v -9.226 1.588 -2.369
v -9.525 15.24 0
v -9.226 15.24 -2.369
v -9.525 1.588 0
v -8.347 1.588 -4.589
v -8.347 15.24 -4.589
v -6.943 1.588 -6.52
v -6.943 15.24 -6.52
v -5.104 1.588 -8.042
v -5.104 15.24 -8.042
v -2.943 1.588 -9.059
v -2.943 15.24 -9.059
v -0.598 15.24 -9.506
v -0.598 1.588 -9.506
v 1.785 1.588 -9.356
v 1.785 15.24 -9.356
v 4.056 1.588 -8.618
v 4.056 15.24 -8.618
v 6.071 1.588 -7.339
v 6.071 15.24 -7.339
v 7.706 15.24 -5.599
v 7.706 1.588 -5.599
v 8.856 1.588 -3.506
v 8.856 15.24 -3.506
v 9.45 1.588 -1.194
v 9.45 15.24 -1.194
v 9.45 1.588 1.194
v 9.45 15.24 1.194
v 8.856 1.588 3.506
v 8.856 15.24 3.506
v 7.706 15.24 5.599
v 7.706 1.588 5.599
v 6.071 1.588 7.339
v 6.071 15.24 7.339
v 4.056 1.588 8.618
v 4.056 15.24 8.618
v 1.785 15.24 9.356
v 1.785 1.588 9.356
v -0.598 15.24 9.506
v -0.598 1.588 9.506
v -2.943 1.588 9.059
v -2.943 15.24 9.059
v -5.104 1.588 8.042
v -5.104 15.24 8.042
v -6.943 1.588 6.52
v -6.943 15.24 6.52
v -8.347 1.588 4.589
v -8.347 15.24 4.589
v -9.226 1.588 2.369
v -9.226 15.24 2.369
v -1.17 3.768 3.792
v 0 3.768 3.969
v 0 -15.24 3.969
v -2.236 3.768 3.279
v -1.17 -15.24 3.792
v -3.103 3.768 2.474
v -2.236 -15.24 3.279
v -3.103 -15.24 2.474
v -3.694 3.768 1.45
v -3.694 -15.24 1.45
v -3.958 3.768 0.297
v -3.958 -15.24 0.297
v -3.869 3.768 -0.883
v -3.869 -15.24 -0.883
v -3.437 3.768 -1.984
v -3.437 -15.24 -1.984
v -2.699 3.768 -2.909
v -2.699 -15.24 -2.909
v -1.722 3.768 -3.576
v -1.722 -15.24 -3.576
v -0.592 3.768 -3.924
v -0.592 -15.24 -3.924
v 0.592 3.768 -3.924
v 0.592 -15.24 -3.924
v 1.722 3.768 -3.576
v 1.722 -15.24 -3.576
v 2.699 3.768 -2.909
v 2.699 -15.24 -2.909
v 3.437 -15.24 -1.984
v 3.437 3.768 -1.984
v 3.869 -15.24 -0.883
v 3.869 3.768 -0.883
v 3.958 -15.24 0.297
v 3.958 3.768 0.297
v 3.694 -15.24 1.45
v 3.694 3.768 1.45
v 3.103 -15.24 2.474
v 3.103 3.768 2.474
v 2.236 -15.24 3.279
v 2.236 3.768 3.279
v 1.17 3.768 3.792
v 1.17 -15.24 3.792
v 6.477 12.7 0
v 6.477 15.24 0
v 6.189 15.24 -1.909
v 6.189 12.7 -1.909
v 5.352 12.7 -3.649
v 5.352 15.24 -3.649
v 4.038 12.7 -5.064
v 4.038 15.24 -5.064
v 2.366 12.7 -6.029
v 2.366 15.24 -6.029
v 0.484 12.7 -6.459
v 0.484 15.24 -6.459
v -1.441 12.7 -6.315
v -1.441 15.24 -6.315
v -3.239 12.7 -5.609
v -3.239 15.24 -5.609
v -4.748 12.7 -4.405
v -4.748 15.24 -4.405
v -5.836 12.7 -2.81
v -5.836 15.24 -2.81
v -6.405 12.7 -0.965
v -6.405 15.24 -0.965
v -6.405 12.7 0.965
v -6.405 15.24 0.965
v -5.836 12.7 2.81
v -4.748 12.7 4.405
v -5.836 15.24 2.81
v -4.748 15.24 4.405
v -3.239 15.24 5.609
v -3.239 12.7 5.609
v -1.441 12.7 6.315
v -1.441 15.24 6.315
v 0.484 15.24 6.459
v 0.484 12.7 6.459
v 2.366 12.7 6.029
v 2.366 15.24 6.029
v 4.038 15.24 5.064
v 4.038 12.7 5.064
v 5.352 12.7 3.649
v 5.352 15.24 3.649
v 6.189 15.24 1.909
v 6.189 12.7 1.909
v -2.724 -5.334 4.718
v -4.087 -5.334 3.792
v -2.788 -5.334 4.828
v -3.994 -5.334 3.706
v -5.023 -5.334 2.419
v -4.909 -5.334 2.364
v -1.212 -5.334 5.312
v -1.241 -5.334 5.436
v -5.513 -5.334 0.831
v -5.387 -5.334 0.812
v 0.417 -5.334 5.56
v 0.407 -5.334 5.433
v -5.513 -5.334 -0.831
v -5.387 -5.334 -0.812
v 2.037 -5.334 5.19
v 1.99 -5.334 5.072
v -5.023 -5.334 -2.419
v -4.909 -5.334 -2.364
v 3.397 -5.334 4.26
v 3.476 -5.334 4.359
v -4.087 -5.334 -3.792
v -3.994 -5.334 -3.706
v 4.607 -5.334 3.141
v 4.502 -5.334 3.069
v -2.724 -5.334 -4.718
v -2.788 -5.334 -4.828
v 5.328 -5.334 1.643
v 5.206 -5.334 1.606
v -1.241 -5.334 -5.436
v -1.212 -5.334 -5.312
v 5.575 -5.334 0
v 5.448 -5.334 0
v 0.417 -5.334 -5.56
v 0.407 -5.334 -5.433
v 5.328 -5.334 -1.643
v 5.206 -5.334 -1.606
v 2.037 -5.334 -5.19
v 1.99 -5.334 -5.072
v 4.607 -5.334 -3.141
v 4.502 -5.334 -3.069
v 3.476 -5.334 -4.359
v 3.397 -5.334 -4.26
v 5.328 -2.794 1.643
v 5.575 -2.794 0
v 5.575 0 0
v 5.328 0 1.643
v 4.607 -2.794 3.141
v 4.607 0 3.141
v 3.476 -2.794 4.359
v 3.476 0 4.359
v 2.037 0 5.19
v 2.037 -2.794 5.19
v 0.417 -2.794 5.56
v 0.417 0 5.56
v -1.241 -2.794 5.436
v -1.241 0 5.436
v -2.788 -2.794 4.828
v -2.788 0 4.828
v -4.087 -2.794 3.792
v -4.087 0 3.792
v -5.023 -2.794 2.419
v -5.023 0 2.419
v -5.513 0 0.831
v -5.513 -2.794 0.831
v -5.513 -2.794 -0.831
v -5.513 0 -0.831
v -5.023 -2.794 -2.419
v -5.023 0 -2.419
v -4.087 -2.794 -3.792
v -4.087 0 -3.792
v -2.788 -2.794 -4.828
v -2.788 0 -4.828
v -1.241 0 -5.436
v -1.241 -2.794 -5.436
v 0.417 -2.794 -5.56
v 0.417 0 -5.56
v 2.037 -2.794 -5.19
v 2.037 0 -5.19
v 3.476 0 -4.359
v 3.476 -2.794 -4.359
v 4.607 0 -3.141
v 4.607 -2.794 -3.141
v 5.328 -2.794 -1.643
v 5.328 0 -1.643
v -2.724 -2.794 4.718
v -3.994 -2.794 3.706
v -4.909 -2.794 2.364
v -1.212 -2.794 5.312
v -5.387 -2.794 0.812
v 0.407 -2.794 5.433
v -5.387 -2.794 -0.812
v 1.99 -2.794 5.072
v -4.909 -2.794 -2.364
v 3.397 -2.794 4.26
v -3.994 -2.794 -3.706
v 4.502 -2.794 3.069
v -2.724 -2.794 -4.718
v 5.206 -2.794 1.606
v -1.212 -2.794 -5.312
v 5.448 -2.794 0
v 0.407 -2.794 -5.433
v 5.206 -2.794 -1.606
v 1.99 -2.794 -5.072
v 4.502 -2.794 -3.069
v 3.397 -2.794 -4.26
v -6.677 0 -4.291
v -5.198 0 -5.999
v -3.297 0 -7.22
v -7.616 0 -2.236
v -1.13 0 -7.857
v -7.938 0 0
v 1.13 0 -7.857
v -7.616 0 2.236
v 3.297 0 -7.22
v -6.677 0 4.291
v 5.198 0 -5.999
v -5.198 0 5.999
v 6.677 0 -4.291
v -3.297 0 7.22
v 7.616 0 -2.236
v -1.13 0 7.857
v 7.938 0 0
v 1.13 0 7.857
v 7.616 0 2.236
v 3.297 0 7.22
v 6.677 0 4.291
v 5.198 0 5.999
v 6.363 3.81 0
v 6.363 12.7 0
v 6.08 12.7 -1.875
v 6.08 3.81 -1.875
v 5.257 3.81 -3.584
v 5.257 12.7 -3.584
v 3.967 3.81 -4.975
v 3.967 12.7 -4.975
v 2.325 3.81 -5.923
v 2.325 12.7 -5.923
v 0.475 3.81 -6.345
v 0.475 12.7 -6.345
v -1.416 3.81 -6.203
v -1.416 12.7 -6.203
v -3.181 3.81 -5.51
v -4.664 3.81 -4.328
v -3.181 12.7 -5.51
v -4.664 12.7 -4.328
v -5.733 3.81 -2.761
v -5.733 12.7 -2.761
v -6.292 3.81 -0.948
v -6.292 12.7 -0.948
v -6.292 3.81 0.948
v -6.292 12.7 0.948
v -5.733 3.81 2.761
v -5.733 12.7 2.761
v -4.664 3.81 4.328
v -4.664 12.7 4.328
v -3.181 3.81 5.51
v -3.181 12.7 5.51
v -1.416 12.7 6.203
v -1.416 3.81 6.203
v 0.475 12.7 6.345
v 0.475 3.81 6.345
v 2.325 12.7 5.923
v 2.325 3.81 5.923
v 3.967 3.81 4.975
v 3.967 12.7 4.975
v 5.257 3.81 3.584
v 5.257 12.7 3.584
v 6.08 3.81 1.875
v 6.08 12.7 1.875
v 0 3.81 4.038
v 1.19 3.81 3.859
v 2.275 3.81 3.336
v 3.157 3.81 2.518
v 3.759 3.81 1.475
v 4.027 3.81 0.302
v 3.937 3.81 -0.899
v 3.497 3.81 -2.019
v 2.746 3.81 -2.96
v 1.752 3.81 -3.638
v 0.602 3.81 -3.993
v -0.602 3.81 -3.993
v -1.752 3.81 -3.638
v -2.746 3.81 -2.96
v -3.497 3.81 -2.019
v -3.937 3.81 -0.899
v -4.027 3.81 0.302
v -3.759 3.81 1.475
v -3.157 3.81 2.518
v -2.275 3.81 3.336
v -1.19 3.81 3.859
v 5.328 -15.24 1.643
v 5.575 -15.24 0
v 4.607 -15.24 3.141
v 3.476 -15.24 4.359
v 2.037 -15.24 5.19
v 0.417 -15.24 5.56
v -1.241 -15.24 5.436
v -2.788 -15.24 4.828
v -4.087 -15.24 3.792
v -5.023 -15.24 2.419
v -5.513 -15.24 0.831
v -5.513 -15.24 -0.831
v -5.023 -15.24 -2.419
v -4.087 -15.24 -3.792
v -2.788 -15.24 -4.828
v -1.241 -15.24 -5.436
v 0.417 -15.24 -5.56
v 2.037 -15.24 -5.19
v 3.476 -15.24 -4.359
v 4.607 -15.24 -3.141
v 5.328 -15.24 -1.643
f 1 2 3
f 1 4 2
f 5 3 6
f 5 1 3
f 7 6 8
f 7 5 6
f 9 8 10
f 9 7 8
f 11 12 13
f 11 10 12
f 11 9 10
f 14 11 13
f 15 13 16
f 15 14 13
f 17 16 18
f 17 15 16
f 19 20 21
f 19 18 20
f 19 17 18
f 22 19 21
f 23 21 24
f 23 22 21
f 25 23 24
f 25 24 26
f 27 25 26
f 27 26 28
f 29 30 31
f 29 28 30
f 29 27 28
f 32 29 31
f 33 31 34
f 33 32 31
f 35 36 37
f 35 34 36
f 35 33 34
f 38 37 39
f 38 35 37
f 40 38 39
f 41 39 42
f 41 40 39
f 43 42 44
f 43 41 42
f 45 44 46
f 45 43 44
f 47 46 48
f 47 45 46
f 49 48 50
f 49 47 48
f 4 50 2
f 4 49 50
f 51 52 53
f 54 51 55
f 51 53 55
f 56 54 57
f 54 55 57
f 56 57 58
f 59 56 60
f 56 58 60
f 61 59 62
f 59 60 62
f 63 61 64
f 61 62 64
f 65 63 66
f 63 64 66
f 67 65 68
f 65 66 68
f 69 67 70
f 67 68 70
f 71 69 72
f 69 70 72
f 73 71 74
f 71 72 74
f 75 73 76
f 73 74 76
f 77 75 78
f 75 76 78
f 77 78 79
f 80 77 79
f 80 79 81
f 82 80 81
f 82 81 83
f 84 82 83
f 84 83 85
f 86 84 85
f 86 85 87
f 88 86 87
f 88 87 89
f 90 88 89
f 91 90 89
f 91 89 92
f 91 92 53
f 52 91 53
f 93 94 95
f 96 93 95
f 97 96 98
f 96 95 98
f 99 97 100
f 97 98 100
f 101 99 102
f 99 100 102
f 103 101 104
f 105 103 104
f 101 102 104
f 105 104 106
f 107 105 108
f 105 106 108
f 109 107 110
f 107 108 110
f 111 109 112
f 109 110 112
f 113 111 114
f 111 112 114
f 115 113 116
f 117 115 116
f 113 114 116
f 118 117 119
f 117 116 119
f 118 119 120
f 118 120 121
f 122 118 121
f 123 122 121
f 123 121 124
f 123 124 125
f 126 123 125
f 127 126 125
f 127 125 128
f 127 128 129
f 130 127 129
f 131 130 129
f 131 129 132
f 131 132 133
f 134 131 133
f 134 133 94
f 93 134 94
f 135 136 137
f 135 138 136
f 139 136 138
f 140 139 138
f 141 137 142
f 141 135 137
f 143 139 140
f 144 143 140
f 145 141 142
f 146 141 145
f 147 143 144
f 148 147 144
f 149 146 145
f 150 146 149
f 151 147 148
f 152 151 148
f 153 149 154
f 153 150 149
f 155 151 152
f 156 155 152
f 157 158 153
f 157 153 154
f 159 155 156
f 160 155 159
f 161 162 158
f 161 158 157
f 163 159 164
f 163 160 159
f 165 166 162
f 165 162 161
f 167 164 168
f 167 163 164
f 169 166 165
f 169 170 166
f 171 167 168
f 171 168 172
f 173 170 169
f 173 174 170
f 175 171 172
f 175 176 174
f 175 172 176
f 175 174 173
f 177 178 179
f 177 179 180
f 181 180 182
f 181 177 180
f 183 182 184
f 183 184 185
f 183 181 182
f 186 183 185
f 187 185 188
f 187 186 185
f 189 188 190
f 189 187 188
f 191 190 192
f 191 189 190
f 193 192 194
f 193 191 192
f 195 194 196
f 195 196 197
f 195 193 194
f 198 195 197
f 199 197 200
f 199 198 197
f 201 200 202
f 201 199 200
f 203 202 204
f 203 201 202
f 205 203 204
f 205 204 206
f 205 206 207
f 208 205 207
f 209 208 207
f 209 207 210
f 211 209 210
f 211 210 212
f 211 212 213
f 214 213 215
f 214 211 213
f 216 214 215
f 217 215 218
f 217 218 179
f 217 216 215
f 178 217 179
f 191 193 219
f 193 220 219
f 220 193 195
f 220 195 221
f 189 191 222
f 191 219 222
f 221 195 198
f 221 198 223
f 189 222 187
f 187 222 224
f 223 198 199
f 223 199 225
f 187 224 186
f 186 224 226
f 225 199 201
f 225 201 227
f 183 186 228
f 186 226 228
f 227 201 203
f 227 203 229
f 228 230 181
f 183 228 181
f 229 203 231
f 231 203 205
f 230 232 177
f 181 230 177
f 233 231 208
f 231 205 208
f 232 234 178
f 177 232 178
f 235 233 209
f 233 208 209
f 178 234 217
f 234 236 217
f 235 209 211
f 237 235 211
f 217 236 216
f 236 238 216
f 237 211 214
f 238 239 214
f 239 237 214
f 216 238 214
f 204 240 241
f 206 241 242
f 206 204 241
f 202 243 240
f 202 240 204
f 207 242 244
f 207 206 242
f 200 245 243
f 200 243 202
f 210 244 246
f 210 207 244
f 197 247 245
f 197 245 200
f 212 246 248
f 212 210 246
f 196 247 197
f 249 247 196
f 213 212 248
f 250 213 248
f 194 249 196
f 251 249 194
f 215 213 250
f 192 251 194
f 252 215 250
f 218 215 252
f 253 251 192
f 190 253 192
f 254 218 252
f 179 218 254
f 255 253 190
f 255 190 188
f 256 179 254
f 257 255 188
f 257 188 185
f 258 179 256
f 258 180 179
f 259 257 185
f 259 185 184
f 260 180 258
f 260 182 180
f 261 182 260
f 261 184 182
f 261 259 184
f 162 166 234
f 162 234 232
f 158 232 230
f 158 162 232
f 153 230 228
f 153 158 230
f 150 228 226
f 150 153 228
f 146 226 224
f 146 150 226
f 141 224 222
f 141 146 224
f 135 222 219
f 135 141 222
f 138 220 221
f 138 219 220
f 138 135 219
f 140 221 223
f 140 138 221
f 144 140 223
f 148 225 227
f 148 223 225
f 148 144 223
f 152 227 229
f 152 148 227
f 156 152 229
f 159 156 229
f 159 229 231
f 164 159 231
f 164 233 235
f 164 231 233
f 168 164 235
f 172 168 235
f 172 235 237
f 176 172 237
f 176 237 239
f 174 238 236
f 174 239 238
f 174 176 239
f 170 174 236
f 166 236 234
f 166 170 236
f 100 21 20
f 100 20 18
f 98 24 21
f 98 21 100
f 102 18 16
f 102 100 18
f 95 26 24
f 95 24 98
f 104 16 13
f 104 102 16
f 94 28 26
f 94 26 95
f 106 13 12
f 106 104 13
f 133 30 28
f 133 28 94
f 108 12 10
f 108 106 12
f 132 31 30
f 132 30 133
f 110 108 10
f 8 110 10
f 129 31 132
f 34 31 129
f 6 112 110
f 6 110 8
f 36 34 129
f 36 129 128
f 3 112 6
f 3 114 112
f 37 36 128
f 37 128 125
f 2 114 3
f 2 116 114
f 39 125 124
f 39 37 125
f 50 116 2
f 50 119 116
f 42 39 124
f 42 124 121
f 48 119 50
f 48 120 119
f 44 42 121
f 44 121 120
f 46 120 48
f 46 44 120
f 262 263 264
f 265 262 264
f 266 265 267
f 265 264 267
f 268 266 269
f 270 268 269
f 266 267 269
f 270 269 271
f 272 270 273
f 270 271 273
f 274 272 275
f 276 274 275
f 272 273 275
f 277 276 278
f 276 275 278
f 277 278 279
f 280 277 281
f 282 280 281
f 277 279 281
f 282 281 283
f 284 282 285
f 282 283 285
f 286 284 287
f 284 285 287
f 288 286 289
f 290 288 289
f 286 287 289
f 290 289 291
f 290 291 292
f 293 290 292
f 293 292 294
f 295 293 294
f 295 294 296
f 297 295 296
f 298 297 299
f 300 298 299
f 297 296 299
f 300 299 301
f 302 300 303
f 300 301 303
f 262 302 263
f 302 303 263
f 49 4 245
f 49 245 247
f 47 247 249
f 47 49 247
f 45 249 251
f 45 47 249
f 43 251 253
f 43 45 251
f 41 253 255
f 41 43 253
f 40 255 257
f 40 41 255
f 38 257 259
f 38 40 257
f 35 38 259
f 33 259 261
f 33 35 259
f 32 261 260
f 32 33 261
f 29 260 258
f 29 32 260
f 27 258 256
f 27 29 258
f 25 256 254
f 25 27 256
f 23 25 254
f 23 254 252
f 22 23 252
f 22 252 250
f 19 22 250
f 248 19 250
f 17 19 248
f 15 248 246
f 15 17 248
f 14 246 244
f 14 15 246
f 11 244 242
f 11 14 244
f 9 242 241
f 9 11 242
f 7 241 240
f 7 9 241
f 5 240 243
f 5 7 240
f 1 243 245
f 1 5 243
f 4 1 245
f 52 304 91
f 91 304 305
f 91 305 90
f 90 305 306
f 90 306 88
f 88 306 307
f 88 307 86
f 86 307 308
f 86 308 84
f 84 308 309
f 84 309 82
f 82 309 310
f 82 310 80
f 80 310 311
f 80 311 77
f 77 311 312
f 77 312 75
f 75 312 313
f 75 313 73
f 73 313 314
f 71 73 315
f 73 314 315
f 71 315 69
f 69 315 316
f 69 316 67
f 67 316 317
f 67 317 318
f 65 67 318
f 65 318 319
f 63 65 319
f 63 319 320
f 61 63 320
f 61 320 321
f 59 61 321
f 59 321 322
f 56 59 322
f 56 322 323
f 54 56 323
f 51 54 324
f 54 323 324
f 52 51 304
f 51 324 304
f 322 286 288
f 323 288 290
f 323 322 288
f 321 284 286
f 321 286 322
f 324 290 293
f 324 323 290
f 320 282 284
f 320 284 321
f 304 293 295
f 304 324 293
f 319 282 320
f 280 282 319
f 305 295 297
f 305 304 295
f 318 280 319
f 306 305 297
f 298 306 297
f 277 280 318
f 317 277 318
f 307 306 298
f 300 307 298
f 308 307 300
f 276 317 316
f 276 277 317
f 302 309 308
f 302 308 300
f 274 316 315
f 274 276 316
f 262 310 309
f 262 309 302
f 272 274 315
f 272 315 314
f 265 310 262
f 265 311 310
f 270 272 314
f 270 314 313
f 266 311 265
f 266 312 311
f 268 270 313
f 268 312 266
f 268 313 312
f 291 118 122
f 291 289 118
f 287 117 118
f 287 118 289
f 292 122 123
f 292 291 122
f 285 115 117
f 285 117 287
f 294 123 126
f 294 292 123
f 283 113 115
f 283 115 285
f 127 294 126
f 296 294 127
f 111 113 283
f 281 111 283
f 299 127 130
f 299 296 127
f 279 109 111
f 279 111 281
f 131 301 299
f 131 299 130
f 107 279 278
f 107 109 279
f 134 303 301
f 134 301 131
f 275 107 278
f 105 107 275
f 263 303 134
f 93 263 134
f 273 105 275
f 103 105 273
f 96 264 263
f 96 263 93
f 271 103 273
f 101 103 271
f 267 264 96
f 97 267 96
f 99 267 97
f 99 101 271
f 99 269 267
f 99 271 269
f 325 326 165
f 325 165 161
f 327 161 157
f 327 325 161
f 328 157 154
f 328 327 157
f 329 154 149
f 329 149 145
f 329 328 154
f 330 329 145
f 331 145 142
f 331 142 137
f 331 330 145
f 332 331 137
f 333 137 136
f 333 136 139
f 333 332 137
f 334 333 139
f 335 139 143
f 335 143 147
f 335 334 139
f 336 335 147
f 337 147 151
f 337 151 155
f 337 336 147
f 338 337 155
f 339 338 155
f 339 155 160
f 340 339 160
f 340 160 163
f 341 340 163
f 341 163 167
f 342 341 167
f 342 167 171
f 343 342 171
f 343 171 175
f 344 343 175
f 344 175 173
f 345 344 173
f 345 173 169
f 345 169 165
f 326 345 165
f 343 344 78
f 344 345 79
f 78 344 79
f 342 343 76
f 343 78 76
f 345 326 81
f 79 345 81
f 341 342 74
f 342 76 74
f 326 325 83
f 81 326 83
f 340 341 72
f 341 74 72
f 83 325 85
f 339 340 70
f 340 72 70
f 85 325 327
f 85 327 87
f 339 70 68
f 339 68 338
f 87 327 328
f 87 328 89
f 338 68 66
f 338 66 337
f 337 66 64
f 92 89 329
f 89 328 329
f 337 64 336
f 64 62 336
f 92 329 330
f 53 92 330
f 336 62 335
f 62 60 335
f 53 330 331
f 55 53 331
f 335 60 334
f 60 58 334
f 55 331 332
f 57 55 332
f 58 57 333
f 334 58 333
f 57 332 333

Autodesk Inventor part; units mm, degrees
ref_plane "YZ Plane" through (0, 0, 0) normal (1, 0, 0) x (0, 1, 0)
ref_plane "XZ Plane" through (0, 0, 0) normal (0, 1, 0) x (-1, 0, 0)
ref_plane "XY Plane" through (0, 0, 0) normal (0, 0, 1) x (1, 0, 0)
sketch "Sketch1" plane through (0, 0, 0) normal (0, 1, 0) x (-1, 0, 0)
  circle A0 centre (0, 0) radius 9.525
  dimension "d0" = 19.05
extrude "Extrusion1" add sketch "Sketch1" along normal mid plane 30.48
sketch "Sketch3" plane through (0, 15.24, 0) normal (0, 1, 0) x (1, 0, 0)
  point P0 (0, 0)
  point P1 (0, 0)
hole "Hole1" at (0, 15.24, 0) direction (0, -1, 0) diameter 7.9375 end through all
sketch "Sketch4" plane through (0, 15.24, 0) normal (0, 1, 0) x (1, 0, 0)
  point P0 (0, 0)
  point P1 (0, 0)
hole "Hole2" at (0, 15.24, 0) direction (0, -1, 0) diameter 12.3031 depth 10.16 tip angle 118
sketch "Sketch5" plane through (0, 15.24, 0) normal (0, 1, 0) x (1, 0, 0)
  circle A0 centre (0, 0) radius 6.3627
  dimension "d20" = 12.7254
extrude "Extrusion3" cut sketch "Sketch5" against normal blind 11.43
sketch "Sketch6" plane through (0, 15.24, 0) normal (0, 1, 0) x (1, 0, 0)
  circle A0 centre (0, 0) radius 6.477
  dimension "d23" = 12.954
extrude "Extrusion4" cut sketch "Sketch6" against normal blind 2.54
sketch "Sketch7" plane through (0, -15.24, 0) normal (0, -1, 0) x (1, 0, 0)
  circle A0 centre (0, 0) radius 9.525
  circle A1 centre (0, 0) radius 9.525 projected
  circle A2 centre (0, 0) radius 5.5753
  dimension "d26" = 11.1506
extrude "Extrusion5" cut sketch "Sketch7" against normal blind 15.24
sketch "Sketch9" plane through (0, 0, 0) normal (0, 0, 1) x (1, 0, 0)
  line L0 (3.9688, -15.24) -> (-3.9688, -15.24) projected
  line L1 (0, -15.24) -> (0, -4.064) construction
  line L2 (0, -15.24) -> (11.176, -15.24) construction
  line L3 (0, -4.064) -> (5.5753, -4.064) construction
  line L4 (5.5753, -15.24) -> (5.5753, 0) projected
  line L5 (5.7023, -2.794) -> (5.4483, -2.794)
  line L6 (5.4483, -2.794) -> (5.4483, -5.334)
  line L7 (5.4483, -5.334) -> (5.7023, -5.334)
  line L8 (5.7023, -5.334) -> (5.7023, -2.794)
  line L9 (5.7023, -2.794) -> (5.4483, -5.334) construction
  line L10 (5.4483, -2.794) -> (5.7023, -5.334) construction
  point P0 (0, 0)
  dimension "d35" = 11.176
  dimension "d36" = 90
  dimension "d38" = 90
  dimension "d39" = 0.254
  dimension "d40" = 2.54
revolve "Revolution1" cut sketch "Sketch9" angle 360 about axis through (0, -15.24, 0) along (0, 1, 0)
chamfer "Chamfer2" distance 1.5875 angle 45 1 edges at (9.525, 0, 0)
properties part number "fridge bushing" material "Brass"
